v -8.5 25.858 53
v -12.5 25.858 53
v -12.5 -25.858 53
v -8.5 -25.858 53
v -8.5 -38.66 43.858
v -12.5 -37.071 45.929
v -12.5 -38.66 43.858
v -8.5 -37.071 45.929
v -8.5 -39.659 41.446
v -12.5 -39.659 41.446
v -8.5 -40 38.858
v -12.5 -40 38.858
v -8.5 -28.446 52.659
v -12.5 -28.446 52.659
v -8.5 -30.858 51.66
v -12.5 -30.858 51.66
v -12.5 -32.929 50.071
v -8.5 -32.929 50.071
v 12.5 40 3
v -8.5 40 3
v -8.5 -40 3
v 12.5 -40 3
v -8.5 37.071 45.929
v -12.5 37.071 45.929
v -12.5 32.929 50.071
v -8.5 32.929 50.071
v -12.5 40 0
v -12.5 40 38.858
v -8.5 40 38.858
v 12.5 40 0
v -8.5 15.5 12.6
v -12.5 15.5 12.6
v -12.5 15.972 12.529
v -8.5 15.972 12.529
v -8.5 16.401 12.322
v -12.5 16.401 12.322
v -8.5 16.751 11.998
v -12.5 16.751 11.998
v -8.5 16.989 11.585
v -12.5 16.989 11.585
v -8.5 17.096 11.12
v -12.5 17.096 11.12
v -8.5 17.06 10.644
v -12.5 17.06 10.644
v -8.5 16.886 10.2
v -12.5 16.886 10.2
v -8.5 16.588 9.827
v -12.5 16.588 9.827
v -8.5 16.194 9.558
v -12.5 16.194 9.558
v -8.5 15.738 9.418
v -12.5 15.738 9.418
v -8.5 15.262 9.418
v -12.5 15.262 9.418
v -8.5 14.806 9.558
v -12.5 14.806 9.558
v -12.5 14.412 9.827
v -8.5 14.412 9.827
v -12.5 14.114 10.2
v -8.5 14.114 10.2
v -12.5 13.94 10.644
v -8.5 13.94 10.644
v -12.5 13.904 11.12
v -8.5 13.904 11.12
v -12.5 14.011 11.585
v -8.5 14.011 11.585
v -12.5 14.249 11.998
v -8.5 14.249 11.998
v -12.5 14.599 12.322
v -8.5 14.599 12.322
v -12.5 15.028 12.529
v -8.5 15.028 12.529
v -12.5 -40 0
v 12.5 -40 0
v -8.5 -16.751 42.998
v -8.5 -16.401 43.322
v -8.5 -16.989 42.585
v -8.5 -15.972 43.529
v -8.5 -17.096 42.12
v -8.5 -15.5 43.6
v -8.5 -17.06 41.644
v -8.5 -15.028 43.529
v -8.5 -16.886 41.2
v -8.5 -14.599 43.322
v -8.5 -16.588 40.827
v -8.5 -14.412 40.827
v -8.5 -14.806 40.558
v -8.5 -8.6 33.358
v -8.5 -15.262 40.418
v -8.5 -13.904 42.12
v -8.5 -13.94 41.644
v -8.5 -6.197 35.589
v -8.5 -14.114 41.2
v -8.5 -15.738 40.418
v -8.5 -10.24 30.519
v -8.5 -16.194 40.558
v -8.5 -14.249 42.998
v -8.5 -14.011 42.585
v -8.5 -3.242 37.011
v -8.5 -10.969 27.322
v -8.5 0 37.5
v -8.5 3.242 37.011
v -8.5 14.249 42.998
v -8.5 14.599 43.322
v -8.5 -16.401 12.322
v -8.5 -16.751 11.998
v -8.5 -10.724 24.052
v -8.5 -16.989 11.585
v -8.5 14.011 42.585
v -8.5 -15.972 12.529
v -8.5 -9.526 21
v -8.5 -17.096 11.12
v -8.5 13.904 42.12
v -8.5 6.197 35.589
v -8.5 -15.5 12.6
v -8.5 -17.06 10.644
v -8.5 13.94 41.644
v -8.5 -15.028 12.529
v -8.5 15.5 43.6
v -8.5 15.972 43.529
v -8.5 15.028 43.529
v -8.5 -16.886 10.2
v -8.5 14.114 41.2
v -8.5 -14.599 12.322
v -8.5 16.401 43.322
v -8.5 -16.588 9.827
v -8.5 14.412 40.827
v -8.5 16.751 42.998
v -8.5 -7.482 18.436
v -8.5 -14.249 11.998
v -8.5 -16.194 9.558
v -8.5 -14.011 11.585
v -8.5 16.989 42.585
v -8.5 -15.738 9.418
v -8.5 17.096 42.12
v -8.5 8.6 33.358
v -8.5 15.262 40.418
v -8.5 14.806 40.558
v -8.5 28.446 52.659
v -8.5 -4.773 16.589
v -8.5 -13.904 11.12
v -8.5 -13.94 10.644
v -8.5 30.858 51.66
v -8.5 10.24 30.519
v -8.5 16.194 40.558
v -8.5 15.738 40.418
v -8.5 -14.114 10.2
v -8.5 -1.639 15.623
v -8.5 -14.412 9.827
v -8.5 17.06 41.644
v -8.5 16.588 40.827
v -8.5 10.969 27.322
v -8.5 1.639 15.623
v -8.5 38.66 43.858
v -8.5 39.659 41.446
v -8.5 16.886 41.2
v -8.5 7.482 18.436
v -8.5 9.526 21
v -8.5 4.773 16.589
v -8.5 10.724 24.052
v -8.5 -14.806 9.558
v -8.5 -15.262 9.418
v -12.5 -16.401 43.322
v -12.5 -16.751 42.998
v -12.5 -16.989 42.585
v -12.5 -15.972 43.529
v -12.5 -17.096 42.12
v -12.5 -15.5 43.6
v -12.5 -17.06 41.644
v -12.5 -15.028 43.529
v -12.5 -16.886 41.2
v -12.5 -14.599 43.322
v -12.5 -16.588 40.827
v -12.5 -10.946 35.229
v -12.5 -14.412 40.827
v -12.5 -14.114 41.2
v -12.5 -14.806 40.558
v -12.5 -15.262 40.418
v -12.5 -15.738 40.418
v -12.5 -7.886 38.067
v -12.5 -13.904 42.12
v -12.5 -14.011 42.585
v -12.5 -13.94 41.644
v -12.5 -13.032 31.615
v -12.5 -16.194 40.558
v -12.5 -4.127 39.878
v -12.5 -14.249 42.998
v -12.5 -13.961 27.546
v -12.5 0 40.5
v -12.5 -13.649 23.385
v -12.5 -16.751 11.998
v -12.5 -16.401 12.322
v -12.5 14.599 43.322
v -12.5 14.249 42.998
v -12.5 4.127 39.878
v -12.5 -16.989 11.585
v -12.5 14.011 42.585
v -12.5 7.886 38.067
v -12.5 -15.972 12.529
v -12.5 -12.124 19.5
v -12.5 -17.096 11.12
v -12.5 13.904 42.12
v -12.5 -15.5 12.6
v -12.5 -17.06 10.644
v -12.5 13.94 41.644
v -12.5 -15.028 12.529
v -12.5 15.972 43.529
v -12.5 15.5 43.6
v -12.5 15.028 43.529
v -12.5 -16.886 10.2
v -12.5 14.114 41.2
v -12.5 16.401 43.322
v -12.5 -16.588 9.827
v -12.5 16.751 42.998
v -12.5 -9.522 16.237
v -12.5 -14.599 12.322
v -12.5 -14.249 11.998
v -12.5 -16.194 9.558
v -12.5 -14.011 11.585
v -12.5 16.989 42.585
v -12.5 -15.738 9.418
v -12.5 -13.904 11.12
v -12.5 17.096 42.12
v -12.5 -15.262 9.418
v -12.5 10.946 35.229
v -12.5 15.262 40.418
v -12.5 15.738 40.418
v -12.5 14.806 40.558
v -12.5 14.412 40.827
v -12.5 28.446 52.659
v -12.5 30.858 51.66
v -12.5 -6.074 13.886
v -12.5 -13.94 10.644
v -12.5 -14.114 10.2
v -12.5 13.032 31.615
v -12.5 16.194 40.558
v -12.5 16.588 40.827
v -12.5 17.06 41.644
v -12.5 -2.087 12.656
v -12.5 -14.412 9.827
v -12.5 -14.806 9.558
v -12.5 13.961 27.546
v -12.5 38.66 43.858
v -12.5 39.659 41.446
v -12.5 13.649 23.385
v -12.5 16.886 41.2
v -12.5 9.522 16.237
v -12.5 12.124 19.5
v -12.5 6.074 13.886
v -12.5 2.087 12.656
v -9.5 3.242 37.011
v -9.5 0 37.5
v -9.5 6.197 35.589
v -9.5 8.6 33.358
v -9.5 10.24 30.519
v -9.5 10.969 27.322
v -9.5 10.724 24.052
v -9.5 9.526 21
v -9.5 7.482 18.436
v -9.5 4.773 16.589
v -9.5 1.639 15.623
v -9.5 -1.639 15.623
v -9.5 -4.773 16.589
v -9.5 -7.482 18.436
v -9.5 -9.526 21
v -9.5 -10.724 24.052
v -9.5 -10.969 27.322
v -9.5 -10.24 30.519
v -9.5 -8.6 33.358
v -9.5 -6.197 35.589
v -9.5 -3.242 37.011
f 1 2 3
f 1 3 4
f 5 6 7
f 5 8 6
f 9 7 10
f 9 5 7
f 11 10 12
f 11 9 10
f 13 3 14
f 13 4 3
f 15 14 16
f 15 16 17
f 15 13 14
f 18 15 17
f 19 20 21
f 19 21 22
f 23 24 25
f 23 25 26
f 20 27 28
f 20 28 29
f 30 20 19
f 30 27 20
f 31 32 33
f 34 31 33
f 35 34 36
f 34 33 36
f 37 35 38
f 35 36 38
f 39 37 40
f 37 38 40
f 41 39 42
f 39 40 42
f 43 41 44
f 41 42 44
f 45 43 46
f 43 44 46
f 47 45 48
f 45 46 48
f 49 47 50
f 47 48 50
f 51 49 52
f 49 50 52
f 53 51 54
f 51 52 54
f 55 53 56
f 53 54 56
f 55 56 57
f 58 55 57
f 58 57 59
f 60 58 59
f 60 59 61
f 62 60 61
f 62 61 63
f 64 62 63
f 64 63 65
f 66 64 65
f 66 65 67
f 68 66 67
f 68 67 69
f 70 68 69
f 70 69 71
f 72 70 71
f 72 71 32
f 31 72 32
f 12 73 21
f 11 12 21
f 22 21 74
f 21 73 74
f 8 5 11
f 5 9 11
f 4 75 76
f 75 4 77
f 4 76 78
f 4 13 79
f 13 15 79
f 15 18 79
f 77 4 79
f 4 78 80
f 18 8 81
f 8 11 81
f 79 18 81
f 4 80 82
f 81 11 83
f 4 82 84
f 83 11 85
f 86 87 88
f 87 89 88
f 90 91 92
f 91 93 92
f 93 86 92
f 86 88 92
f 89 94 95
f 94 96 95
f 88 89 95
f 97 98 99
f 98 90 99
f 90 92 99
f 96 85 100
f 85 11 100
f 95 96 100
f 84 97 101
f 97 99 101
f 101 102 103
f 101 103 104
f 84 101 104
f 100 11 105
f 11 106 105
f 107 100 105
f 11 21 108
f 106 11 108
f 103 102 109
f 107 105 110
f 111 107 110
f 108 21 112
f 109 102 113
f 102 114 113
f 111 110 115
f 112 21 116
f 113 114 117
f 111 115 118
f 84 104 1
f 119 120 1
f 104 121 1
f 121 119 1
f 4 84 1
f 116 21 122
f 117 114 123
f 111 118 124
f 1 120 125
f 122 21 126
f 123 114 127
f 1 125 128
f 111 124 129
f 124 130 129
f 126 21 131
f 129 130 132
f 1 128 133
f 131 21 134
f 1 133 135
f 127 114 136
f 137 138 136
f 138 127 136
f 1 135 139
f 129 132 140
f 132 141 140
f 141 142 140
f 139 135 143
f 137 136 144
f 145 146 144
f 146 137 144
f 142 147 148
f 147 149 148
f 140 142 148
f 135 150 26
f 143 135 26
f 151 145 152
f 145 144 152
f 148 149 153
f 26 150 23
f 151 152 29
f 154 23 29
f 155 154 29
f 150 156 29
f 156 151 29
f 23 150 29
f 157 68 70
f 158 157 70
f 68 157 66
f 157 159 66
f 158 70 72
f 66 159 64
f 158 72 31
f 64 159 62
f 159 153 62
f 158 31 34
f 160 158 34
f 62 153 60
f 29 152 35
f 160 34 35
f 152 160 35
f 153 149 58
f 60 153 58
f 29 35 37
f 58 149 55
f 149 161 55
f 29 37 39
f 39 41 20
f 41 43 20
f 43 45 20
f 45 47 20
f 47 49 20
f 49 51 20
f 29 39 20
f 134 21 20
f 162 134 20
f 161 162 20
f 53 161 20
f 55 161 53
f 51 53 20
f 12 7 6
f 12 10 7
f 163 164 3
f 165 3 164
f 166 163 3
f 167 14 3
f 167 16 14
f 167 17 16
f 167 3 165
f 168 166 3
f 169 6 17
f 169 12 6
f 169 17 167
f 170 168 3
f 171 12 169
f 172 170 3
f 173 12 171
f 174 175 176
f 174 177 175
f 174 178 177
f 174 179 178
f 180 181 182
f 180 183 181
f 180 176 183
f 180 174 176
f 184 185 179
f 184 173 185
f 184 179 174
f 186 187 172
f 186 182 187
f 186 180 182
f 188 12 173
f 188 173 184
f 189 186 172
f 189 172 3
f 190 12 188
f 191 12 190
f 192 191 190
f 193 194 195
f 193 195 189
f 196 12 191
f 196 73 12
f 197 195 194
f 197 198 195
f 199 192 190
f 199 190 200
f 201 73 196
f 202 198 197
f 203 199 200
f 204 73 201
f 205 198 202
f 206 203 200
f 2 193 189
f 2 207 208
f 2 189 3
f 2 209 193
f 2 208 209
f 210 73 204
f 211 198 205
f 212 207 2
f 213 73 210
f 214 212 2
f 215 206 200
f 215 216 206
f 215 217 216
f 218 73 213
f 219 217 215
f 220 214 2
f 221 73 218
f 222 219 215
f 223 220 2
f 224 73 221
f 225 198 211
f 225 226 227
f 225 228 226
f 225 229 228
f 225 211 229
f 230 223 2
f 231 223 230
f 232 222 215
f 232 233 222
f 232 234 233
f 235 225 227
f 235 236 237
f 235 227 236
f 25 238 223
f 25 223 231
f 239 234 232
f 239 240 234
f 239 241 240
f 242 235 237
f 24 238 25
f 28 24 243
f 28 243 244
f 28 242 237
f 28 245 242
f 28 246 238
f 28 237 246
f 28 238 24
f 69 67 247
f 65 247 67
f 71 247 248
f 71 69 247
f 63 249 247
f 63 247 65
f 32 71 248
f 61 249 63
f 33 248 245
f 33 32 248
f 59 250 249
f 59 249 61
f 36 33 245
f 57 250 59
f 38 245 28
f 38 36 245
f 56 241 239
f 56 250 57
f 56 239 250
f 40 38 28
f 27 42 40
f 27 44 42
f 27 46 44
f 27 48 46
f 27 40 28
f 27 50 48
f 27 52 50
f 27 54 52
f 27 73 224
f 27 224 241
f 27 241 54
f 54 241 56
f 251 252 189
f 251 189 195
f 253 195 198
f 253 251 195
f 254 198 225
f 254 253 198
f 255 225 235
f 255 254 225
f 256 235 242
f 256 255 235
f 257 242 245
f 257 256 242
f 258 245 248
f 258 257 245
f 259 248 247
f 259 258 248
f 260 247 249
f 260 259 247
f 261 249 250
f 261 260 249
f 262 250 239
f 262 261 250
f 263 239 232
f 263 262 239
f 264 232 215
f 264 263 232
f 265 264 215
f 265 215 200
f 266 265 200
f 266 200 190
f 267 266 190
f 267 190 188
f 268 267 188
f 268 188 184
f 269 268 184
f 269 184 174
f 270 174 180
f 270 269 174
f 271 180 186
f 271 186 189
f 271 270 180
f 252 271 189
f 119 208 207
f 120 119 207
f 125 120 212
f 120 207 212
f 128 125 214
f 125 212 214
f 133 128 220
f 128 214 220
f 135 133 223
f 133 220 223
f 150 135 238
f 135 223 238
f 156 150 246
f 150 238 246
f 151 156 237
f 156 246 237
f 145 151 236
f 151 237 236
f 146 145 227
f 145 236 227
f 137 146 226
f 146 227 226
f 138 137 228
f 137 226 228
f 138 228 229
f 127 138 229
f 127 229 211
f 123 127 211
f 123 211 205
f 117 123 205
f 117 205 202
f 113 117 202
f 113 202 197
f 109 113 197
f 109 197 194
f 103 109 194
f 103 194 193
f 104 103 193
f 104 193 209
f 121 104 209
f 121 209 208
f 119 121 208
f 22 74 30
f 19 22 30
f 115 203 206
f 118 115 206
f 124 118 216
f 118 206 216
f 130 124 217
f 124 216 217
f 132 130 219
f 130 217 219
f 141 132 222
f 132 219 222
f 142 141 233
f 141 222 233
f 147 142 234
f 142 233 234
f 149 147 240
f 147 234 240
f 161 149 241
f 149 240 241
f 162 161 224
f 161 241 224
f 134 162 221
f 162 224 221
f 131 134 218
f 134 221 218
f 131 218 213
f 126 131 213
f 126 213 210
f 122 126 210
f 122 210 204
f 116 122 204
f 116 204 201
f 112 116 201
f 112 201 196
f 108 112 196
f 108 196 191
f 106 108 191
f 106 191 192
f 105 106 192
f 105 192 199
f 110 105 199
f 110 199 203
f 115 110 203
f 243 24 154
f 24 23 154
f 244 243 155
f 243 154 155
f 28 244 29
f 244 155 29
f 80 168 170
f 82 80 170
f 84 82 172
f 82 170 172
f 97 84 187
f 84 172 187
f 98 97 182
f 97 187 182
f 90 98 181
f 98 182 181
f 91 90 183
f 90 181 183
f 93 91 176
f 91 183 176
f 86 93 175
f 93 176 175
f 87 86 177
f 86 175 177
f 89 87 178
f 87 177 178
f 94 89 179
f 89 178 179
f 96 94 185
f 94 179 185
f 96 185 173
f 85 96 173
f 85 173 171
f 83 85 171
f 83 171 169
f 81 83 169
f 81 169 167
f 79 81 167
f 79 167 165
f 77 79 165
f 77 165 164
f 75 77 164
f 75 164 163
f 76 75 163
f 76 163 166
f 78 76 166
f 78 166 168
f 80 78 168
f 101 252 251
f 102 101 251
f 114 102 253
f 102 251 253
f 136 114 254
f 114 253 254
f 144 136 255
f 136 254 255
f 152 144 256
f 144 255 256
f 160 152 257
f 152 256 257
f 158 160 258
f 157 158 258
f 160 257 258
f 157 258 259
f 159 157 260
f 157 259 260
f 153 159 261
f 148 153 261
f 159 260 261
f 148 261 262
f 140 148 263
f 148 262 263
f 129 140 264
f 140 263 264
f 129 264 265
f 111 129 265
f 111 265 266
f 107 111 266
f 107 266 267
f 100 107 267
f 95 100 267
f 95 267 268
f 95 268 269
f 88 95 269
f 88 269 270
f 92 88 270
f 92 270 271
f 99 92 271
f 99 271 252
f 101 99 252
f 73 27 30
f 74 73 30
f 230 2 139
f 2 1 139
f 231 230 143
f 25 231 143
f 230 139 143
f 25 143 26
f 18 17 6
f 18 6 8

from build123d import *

# Parameters (mm, degrees)
CROQUIS1_W              = 25
CROQUIS1_H              = 80
SALIENTE_EXTRUIR1_DEPTH = 3
CROQUIS2_W              = 4
CROQUIS2_H              = 80
SALIENTE_EXTRUIR2_DEPTH = 50
CHAFL_N1_SIZE           = 10
REDONDEO1_R             = 10
CROQUIS3_R              = 1.6
CROQUIS3_R_2            = 11
CORTAR_EXTRUIR1_DEPTH   = 50
CHAFL_N2_SIZE           = 3


with BuildPart() as part:
    # Croquis1 → Saliente-Extruir1 (new body)
    with BuildSketch(Plane.XY):
        Rectangle(CROQUIS1_W, CROQUIS1_H)
    extrude(amount=SALIENTE_EXTRUIR1_DEPTH)

    # Croquis2 → Saliente-Extruir2 (add)
    with BuildSketch(Plane.XY.offset(3)):
        with Locations((-10.5, 0)):
            Rectangle(CROQUIS2_W, CROQUIS2_H)
    extrude(amount=SALIENTE_EXTRUIR2_DEPTH)

    # Chaflán1
    chafl_n1_edges = [part.edges().sort_by_distance(p)[0] for p in [
        (-10.5, -40, 53),
        (-10.5, 40, 53),
    ]]
    chamfer(chafl_n1_edges, length=CHAFL_N1_SIZE)

    # Redondeo1
    redondeo1_edges = [part.edges().sort_by_distance(p)[0] for p in [
        (-10.5, 30, 53),
        (-10.5, -30, 53),
        (-10.5, -40, 43),
        (-10.5, 40, 43),
    ]]
    fillet(redondeo1_edges, radius=REDONDEO1_R)

    # Croquis3 → Cortar-Extruir1 (cut)
    with BuildSketch(Plane.ZY.offset(12.5)):
        with Locations((11, 15.5)):
            Circle(CROQUIS3_R)
        with Locations((42, 15.5)):
            Circle(CROQUIS3_R)
        with Locations((11, -15.5)):
            Circle(CROQUIS3_R)
        with Locations((42, -15.5)):
            Circle(CROQUIS3_R)
        with Locations((26.5, 0)):
            Circle(CROQUIS3_R_2)
    extrude(amount=-CORTAR_EXTRUIR1_DEPTH, mode=Mode.SUBTRACT)

    # Chaflán2
    chafl_n2_edges = [part.edges().sort_by_distance(p)[0] for p in [
        (-12.5, 0, 15.5),
    ]]
    chamfer(chafl_n2_edges, length=CHAFL_N2_SIZE)


solid = part.part
